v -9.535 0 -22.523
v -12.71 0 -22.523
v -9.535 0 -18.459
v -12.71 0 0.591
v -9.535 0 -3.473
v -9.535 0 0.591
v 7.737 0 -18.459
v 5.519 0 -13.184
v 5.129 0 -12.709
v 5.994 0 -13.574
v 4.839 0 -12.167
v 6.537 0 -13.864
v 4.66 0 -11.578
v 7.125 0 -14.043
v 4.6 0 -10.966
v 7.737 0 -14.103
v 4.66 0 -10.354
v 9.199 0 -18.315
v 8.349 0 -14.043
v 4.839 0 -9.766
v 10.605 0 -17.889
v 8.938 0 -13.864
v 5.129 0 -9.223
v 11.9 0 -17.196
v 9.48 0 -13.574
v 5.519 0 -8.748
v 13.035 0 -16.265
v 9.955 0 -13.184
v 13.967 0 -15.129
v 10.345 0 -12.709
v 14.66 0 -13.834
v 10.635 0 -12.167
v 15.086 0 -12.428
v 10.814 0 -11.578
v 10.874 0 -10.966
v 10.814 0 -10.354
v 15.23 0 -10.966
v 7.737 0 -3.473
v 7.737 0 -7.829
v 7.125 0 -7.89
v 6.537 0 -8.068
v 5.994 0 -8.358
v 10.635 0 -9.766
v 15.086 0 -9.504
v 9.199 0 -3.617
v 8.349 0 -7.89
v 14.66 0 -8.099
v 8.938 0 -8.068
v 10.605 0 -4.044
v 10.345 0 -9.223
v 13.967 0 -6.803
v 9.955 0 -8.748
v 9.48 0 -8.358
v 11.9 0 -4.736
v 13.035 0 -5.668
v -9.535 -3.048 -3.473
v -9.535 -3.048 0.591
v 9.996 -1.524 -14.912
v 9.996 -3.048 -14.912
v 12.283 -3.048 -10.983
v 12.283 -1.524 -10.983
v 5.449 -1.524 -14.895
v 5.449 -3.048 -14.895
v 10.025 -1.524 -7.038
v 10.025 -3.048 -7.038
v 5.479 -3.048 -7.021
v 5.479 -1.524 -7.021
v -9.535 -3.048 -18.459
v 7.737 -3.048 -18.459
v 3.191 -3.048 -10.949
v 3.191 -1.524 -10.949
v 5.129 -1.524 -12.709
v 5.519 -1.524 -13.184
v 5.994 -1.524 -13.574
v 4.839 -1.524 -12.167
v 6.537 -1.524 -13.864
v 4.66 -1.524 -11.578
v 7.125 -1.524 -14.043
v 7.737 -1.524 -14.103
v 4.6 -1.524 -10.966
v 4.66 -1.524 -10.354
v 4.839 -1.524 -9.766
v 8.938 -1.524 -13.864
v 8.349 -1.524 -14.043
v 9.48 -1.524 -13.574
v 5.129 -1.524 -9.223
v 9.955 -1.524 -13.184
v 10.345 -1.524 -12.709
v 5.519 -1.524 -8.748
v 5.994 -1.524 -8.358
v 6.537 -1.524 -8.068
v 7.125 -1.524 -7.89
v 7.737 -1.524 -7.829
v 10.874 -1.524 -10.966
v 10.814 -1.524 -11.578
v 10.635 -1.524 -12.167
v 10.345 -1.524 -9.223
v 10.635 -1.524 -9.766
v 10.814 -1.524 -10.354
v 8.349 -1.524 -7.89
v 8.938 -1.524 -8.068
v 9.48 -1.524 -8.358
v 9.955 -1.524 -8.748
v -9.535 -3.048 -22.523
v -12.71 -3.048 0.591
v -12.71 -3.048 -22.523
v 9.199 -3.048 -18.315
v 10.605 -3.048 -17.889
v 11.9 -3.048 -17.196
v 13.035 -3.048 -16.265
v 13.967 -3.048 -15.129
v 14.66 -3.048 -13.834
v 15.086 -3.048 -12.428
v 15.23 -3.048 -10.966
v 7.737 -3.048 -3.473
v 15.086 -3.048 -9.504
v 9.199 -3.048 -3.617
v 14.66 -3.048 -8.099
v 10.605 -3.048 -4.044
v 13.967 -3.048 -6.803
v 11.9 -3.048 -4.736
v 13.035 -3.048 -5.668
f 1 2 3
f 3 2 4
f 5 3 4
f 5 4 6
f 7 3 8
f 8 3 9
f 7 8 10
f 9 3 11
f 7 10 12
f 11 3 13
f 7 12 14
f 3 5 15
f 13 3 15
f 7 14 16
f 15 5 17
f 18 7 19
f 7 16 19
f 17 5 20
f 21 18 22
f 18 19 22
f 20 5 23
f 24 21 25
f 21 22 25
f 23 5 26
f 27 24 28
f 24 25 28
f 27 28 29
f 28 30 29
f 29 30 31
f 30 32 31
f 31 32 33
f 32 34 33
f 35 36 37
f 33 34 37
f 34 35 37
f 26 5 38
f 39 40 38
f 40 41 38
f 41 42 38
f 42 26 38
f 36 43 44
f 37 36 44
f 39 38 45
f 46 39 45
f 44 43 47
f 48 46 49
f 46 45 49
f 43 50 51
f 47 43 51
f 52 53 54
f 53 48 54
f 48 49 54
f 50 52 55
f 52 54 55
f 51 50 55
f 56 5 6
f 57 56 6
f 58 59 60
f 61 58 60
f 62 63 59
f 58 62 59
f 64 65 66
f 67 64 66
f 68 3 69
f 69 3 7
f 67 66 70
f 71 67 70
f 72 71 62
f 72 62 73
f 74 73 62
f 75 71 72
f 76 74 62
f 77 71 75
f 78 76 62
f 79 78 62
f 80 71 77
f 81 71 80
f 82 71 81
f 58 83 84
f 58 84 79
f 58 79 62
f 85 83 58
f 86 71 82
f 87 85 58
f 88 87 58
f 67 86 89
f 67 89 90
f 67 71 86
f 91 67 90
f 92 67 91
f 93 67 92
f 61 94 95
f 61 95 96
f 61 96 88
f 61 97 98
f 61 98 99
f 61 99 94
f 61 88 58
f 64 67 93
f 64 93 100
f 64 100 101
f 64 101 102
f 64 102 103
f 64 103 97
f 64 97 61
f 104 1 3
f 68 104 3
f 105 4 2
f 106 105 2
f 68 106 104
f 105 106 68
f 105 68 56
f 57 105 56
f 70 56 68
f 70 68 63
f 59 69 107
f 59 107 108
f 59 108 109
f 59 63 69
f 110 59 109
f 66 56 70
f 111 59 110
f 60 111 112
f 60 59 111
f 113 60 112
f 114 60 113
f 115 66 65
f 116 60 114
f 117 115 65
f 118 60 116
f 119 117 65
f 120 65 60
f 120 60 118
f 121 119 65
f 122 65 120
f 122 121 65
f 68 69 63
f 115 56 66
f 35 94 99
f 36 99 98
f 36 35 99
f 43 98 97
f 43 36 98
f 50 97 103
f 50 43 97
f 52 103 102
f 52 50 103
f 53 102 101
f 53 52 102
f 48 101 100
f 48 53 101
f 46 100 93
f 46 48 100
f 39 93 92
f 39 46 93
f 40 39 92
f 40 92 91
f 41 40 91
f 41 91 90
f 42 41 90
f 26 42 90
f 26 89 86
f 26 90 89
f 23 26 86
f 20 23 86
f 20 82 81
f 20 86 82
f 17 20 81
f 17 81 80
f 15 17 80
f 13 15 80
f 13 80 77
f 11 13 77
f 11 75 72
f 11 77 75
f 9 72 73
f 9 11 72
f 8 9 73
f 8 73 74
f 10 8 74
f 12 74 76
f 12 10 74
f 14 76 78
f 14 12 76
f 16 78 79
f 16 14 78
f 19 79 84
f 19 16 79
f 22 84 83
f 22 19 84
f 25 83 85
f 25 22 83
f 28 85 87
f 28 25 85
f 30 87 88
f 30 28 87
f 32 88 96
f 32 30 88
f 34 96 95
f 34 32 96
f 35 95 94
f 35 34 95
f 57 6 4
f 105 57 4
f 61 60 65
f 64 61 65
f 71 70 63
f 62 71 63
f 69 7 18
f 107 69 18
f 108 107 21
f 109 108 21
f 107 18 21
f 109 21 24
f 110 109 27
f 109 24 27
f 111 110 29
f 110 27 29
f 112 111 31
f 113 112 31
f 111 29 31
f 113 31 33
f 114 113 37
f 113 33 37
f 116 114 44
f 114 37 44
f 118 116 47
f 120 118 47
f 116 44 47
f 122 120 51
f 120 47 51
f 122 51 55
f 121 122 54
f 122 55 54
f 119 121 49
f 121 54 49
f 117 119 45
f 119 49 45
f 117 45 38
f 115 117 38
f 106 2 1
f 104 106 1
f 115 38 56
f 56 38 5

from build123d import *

# Parameters (mm, degrees)
F0_R     = 3.1369
F1_DEPTH = 3.048
F3_DEPTH = 1.524


with BuildPart() as f1:
    # F0 (on Front) → F1 (new body)
    with BuildSketch(Plane.XZ):
        with BuildLine():
            Line((-9.53489, 0.590851), (-12.70989, 0.590851))
            Line((-12.70989, 0.590851), (-12.70989, -22.523149))
            Line((-12.70989, -22.523149), (-9.53489, -22.523149))
            Line((-9.53489, -22.523149), (-9.53489, -18.459149))
            Line((-9.53489, -18.459149), (7.73711, -18.459149))
            ThreePointArc((7.73711, -18.459149), (15.23011, -10.966149), (7.73711, -3.473149))
            Line((7.73711, -3.473149), (-9.53489, -3.473149))
            Line((-9.53489, -3.473149), (-9.53489, 0.590851))
        make_face()
        with Locations((7.73711, -10.966149)):
            Circle(F0_R, mode=Mode.SUBTRACT)
    extrude(amount=F1_DEPTH)

    # F2 (on face) → F3 (cut)
    with BuildSketch(Plane.XZ.offset(3.048)):
        Polygon((5.478697, -7.020747), (3.191085, -10.949291), (5.449498, -14.894693), (9.995523, -14.911551), (12.283135, -10.983007), (10.024722, -7.037605), align=None)
    extrude(amount=-F3_DEPTH, mode=Mode.SUBTRACT)


solid = f1.part
